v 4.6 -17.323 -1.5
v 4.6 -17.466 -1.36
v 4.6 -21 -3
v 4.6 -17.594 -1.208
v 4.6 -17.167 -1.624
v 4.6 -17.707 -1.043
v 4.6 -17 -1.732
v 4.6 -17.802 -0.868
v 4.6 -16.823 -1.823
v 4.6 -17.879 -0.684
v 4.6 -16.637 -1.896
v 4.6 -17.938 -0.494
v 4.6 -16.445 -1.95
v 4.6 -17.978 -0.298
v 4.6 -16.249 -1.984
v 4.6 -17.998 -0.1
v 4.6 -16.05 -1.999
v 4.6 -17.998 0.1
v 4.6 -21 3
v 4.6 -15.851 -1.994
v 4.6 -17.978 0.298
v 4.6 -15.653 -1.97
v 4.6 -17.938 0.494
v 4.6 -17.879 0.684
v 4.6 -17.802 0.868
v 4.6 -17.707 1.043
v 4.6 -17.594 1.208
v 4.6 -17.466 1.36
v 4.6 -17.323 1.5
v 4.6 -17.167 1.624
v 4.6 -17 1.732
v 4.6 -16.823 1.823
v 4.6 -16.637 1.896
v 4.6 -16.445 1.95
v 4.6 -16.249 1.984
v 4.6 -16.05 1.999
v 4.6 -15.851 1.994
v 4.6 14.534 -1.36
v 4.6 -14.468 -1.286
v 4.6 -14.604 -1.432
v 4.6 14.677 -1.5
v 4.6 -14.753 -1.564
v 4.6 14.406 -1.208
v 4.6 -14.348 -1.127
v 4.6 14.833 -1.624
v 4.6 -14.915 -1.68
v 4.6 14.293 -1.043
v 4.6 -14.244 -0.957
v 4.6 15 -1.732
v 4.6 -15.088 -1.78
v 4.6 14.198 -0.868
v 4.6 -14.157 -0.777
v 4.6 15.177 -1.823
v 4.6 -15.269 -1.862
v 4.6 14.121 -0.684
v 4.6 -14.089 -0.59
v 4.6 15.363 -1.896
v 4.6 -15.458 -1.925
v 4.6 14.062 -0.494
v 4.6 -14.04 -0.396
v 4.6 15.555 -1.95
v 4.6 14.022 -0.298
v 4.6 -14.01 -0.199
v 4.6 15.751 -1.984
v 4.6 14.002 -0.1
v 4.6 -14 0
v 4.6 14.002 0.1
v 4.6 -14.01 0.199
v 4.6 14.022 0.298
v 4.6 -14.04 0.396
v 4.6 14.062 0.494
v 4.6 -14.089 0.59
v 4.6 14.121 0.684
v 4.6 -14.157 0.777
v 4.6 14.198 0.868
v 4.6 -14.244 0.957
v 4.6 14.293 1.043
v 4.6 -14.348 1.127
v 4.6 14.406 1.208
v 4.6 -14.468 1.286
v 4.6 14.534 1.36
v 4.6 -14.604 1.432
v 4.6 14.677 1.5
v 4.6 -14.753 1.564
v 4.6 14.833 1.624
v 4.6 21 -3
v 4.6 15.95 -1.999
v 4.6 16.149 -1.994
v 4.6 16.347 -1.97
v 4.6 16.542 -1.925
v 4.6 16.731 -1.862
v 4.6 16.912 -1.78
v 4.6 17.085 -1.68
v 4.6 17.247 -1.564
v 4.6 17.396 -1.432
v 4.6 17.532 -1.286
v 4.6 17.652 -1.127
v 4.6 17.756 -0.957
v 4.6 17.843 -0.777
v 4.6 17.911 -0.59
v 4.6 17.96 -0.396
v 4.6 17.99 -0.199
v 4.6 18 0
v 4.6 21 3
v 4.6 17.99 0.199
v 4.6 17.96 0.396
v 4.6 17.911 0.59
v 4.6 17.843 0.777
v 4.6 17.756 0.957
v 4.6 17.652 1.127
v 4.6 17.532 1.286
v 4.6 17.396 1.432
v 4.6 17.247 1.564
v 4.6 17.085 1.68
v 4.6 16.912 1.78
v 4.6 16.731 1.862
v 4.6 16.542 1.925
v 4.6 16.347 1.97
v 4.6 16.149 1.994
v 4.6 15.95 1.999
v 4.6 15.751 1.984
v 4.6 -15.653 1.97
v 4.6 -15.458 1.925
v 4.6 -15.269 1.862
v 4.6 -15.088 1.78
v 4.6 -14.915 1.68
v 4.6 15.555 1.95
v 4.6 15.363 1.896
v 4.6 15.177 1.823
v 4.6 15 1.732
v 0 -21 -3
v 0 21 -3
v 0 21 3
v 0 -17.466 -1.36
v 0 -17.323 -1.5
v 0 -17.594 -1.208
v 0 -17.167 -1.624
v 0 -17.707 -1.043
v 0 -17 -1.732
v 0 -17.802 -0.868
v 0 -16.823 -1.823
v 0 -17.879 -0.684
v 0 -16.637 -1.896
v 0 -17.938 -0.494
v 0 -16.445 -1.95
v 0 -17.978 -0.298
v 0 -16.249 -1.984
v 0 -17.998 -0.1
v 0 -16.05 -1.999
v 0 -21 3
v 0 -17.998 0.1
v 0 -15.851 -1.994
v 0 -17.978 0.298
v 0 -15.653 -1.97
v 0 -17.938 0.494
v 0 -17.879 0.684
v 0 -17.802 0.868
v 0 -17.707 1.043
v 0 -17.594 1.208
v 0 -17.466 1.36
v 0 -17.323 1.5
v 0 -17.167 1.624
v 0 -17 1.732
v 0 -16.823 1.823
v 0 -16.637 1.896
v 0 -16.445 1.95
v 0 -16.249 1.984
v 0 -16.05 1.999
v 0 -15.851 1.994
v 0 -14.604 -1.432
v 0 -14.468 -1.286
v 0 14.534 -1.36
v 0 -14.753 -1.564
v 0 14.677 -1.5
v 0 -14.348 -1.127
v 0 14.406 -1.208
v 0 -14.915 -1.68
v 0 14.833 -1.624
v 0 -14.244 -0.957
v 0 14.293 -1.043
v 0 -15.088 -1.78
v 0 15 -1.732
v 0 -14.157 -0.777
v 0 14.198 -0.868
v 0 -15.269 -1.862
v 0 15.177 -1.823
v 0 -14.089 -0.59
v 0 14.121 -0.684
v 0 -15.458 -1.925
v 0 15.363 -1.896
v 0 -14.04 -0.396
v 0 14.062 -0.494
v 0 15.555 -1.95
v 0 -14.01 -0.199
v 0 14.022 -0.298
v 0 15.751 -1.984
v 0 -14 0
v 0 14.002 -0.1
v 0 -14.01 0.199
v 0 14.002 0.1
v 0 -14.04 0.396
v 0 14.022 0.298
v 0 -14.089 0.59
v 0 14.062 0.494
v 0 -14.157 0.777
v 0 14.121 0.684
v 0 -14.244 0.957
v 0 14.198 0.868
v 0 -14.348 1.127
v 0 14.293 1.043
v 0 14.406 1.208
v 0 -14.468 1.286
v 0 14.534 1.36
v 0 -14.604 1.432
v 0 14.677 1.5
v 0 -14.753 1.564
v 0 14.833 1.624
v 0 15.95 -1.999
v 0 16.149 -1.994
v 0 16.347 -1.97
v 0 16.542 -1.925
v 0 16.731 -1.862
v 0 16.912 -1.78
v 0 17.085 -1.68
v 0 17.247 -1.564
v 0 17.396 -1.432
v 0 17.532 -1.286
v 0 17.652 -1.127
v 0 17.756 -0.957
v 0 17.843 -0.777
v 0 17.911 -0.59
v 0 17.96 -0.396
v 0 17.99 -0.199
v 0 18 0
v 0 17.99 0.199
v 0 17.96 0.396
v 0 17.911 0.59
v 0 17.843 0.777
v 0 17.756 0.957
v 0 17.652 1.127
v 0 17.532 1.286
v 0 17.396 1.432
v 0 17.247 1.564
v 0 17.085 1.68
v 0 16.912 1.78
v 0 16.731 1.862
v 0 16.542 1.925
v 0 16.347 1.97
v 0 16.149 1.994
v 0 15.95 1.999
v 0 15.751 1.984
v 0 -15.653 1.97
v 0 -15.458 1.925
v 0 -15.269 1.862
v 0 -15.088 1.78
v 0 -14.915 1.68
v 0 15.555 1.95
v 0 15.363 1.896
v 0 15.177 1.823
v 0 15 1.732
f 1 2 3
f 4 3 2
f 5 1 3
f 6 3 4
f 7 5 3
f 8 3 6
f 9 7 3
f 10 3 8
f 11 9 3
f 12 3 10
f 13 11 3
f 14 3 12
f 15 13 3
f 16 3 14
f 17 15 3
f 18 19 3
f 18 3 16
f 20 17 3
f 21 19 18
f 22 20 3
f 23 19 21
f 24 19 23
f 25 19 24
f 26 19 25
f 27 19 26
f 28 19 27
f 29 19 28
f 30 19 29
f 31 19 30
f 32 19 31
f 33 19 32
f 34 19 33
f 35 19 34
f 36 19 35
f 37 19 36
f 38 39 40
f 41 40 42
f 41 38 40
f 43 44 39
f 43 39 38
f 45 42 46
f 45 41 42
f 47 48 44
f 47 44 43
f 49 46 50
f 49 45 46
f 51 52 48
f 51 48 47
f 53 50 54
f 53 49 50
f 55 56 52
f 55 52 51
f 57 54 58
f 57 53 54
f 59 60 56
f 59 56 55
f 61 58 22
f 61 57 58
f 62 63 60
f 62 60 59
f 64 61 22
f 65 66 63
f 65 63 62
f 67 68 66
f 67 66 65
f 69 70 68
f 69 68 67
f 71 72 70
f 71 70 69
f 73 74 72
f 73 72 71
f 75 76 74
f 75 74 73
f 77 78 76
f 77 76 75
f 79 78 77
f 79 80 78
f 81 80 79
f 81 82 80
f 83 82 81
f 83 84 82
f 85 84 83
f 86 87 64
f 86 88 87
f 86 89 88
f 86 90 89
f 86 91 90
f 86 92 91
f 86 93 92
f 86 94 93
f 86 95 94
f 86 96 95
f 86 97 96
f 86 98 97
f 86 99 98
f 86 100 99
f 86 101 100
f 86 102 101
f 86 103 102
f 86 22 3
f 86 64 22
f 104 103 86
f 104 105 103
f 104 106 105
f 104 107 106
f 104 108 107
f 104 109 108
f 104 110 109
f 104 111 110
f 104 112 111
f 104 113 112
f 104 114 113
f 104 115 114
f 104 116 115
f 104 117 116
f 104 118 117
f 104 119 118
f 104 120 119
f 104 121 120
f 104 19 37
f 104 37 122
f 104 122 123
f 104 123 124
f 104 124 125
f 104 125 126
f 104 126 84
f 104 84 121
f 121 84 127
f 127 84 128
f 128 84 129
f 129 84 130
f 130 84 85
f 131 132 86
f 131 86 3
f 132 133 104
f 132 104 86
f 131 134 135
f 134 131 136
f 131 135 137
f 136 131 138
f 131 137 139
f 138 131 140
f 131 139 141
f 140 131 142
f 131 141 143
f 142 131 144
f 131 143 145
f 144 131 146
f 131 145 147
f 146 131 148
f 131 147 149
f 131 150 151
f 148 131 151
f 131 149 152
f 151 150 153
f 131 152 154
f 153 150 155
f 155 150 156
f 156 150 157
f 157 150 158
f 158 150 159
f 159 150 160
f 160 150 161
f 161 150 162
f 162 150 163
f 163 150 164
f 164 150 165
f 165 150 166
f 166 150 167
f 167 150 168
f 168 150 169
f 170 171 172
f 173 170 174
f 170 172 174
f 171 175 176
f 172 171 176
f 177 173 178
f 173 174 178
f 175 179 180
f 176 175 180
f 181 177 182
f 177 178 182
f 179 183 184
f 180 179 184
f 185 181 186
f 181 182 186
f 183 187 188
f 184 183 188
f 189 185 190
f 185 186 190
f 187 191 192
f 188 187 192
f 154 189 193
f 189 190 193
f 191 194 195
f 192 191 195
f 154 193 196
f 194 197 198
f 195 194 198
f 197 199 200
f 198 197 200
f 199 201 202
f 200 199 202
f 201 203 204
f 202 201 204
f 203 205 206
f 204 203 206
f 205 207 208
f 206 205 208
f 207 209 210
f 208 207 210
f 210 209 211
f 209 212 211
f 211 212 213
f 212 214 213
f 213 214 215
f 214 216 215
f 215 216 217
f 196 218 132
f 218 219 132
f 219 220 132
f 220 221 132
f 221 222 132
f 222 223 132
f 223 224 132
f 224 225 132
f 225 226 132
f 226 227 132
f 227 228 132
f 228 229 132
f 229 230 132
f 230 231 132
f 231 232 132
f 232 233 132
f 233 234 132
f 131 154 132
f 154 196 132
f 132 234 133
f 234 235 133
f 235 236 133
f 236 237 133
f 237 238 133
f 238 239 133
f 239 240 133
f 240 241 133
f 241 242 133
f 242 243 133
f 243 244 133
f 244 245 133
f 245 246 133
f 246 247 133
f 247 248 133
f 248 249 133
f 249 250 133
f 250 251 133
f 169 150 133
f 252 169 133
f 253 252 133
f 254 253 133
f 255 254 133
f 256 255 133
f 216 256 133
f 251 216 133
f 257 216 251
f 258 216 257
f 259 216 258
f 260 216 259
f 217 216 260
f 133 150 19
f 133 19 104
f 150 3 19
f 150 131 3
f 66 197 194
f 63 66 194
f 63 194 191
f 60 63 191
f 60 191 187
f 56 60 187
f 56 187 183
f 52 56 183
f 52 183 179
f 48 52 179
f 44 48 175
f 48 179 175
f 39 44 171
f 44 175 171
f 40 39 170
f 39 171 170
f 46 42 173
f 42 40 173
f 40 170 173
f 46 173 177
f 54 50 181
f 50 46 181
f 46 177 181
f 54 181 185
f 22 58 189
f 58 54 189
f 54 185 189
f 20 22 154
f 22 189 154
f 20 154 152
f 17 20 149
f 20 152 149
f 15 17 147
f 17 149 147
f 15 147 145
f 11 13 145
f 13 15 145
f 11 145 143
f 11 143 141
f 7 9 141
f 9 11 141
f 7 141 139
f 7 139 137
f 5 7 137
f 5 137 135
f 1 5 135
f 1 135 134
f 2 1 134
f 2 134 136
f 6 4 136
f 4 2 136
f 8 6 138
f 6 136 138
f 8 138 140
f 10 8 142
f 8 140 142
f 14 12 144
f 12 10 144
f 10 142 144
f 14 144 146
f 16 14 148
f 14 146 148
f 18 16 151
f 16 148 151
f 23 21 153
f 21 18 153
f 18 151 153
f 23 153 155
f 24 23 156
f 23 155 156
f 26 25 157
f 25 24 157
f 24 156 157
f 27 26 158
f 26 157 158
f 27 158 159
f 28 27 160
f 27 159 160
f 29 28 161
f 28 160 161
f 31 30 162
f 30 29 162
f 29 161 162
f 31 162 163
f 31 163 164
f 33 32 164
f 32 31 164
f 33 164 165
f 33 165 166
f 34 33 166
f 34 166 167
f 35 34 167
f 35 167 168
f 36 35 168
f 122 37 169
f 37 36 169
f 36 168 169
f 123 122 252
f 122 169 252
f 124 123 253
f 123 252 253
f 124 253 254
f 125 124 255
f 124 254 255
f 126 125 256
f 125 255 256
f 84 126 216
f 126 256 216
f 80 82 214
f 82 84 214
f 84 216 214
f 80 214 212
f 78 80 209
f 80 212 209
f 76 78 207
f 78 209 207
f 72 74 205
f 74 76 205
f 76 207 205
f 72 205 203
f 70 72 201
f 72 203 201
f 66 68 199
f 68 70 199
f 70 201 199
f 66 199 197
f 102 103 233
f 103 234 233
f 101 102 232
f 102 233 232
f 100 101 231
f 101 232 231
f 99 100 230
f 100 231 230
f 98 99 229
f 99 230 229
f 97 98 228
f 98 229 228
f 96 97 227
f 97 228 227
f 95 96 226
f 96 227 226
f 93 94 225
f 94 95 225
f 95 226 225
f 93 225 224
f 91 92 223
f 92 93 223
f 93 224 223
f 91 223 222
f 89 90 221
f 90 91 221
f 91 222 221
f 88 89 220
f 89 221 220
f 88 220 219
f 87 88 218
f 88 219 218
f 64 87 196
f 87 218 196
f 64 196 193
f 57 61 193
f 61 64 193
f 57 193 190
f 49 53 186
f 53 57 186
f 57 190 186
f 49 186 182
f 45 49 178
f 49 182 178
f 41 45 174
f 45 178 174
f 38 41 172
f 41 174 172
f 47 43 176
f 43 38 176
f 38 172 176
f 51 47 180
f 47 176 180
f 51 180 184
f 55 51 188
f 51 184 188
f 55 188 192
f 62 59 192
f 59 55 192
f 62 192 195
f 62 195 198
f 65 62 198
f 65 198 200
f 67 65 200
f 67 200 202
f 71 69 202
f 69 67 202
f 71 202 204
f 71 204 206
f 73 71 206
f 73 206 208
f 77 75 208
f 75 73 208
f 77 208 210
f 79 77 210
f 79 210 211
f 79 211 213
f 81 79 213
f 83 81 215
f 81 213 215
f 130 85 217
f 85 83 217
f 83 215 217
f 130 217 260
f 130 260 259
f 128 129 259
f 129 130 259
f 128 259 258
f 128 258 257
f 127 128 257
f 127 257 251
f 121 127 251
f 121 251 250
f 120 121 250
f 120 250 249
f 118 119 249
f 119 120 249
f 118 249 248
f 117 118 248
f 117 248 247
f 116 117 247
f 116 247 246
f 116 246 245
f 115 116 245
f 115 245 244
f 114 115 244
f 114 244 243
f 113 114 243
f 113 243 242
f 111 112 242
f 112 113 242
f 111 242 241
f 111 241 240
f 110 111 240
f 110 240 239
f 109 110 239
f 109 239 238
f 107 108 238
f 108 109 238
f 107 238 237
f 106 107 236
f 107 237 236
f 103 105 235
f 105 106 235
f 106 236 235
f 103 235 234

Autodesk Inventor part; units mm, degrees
ref_plane "YZ Plane" through (0, 0, 0) normal (1, 0, 0) x (0, 1, 0)
ref_plane "XZ Plane" through (0, 0, 0) normal (0, 1, 0) x (-1, 0, 0)
ref_plane "XY Plane" through (0, 0, 0) normal (0, 0, 1) x (1, 0, 0)
sketch "Sketch1" plane through (0, 0, 0) normal (1, 0, 0) x (0, 1, 0)
  circle A0 centre (16, 0) radius 2
  circle A1 centre (-16, 0) radius 2
  line L0 (-21, 3) -> (21, 3)
  line L1 (21, 3) -> (21, -3)
  line L2 (21, -3) -> (-21, -3)
  line L3 (-21, -3) -> (-21, 3)
  line L4 (-21, 3) -> (21, -3) construction
  line L5 (21, 3) -> (-21, -3) construction
  point P0 (0, 0)
  dimension "d0" = 16
  dimension "d1" = 16
  dimension "d2" = 42
  dimension "d3" = 4
  dimension "d4" = 4
  dimension "d5" = 6
extrude "Extrusion1" add sketch "Sketch1" along normal blind 4.6
properties part number "BearingBlockSpacer"
